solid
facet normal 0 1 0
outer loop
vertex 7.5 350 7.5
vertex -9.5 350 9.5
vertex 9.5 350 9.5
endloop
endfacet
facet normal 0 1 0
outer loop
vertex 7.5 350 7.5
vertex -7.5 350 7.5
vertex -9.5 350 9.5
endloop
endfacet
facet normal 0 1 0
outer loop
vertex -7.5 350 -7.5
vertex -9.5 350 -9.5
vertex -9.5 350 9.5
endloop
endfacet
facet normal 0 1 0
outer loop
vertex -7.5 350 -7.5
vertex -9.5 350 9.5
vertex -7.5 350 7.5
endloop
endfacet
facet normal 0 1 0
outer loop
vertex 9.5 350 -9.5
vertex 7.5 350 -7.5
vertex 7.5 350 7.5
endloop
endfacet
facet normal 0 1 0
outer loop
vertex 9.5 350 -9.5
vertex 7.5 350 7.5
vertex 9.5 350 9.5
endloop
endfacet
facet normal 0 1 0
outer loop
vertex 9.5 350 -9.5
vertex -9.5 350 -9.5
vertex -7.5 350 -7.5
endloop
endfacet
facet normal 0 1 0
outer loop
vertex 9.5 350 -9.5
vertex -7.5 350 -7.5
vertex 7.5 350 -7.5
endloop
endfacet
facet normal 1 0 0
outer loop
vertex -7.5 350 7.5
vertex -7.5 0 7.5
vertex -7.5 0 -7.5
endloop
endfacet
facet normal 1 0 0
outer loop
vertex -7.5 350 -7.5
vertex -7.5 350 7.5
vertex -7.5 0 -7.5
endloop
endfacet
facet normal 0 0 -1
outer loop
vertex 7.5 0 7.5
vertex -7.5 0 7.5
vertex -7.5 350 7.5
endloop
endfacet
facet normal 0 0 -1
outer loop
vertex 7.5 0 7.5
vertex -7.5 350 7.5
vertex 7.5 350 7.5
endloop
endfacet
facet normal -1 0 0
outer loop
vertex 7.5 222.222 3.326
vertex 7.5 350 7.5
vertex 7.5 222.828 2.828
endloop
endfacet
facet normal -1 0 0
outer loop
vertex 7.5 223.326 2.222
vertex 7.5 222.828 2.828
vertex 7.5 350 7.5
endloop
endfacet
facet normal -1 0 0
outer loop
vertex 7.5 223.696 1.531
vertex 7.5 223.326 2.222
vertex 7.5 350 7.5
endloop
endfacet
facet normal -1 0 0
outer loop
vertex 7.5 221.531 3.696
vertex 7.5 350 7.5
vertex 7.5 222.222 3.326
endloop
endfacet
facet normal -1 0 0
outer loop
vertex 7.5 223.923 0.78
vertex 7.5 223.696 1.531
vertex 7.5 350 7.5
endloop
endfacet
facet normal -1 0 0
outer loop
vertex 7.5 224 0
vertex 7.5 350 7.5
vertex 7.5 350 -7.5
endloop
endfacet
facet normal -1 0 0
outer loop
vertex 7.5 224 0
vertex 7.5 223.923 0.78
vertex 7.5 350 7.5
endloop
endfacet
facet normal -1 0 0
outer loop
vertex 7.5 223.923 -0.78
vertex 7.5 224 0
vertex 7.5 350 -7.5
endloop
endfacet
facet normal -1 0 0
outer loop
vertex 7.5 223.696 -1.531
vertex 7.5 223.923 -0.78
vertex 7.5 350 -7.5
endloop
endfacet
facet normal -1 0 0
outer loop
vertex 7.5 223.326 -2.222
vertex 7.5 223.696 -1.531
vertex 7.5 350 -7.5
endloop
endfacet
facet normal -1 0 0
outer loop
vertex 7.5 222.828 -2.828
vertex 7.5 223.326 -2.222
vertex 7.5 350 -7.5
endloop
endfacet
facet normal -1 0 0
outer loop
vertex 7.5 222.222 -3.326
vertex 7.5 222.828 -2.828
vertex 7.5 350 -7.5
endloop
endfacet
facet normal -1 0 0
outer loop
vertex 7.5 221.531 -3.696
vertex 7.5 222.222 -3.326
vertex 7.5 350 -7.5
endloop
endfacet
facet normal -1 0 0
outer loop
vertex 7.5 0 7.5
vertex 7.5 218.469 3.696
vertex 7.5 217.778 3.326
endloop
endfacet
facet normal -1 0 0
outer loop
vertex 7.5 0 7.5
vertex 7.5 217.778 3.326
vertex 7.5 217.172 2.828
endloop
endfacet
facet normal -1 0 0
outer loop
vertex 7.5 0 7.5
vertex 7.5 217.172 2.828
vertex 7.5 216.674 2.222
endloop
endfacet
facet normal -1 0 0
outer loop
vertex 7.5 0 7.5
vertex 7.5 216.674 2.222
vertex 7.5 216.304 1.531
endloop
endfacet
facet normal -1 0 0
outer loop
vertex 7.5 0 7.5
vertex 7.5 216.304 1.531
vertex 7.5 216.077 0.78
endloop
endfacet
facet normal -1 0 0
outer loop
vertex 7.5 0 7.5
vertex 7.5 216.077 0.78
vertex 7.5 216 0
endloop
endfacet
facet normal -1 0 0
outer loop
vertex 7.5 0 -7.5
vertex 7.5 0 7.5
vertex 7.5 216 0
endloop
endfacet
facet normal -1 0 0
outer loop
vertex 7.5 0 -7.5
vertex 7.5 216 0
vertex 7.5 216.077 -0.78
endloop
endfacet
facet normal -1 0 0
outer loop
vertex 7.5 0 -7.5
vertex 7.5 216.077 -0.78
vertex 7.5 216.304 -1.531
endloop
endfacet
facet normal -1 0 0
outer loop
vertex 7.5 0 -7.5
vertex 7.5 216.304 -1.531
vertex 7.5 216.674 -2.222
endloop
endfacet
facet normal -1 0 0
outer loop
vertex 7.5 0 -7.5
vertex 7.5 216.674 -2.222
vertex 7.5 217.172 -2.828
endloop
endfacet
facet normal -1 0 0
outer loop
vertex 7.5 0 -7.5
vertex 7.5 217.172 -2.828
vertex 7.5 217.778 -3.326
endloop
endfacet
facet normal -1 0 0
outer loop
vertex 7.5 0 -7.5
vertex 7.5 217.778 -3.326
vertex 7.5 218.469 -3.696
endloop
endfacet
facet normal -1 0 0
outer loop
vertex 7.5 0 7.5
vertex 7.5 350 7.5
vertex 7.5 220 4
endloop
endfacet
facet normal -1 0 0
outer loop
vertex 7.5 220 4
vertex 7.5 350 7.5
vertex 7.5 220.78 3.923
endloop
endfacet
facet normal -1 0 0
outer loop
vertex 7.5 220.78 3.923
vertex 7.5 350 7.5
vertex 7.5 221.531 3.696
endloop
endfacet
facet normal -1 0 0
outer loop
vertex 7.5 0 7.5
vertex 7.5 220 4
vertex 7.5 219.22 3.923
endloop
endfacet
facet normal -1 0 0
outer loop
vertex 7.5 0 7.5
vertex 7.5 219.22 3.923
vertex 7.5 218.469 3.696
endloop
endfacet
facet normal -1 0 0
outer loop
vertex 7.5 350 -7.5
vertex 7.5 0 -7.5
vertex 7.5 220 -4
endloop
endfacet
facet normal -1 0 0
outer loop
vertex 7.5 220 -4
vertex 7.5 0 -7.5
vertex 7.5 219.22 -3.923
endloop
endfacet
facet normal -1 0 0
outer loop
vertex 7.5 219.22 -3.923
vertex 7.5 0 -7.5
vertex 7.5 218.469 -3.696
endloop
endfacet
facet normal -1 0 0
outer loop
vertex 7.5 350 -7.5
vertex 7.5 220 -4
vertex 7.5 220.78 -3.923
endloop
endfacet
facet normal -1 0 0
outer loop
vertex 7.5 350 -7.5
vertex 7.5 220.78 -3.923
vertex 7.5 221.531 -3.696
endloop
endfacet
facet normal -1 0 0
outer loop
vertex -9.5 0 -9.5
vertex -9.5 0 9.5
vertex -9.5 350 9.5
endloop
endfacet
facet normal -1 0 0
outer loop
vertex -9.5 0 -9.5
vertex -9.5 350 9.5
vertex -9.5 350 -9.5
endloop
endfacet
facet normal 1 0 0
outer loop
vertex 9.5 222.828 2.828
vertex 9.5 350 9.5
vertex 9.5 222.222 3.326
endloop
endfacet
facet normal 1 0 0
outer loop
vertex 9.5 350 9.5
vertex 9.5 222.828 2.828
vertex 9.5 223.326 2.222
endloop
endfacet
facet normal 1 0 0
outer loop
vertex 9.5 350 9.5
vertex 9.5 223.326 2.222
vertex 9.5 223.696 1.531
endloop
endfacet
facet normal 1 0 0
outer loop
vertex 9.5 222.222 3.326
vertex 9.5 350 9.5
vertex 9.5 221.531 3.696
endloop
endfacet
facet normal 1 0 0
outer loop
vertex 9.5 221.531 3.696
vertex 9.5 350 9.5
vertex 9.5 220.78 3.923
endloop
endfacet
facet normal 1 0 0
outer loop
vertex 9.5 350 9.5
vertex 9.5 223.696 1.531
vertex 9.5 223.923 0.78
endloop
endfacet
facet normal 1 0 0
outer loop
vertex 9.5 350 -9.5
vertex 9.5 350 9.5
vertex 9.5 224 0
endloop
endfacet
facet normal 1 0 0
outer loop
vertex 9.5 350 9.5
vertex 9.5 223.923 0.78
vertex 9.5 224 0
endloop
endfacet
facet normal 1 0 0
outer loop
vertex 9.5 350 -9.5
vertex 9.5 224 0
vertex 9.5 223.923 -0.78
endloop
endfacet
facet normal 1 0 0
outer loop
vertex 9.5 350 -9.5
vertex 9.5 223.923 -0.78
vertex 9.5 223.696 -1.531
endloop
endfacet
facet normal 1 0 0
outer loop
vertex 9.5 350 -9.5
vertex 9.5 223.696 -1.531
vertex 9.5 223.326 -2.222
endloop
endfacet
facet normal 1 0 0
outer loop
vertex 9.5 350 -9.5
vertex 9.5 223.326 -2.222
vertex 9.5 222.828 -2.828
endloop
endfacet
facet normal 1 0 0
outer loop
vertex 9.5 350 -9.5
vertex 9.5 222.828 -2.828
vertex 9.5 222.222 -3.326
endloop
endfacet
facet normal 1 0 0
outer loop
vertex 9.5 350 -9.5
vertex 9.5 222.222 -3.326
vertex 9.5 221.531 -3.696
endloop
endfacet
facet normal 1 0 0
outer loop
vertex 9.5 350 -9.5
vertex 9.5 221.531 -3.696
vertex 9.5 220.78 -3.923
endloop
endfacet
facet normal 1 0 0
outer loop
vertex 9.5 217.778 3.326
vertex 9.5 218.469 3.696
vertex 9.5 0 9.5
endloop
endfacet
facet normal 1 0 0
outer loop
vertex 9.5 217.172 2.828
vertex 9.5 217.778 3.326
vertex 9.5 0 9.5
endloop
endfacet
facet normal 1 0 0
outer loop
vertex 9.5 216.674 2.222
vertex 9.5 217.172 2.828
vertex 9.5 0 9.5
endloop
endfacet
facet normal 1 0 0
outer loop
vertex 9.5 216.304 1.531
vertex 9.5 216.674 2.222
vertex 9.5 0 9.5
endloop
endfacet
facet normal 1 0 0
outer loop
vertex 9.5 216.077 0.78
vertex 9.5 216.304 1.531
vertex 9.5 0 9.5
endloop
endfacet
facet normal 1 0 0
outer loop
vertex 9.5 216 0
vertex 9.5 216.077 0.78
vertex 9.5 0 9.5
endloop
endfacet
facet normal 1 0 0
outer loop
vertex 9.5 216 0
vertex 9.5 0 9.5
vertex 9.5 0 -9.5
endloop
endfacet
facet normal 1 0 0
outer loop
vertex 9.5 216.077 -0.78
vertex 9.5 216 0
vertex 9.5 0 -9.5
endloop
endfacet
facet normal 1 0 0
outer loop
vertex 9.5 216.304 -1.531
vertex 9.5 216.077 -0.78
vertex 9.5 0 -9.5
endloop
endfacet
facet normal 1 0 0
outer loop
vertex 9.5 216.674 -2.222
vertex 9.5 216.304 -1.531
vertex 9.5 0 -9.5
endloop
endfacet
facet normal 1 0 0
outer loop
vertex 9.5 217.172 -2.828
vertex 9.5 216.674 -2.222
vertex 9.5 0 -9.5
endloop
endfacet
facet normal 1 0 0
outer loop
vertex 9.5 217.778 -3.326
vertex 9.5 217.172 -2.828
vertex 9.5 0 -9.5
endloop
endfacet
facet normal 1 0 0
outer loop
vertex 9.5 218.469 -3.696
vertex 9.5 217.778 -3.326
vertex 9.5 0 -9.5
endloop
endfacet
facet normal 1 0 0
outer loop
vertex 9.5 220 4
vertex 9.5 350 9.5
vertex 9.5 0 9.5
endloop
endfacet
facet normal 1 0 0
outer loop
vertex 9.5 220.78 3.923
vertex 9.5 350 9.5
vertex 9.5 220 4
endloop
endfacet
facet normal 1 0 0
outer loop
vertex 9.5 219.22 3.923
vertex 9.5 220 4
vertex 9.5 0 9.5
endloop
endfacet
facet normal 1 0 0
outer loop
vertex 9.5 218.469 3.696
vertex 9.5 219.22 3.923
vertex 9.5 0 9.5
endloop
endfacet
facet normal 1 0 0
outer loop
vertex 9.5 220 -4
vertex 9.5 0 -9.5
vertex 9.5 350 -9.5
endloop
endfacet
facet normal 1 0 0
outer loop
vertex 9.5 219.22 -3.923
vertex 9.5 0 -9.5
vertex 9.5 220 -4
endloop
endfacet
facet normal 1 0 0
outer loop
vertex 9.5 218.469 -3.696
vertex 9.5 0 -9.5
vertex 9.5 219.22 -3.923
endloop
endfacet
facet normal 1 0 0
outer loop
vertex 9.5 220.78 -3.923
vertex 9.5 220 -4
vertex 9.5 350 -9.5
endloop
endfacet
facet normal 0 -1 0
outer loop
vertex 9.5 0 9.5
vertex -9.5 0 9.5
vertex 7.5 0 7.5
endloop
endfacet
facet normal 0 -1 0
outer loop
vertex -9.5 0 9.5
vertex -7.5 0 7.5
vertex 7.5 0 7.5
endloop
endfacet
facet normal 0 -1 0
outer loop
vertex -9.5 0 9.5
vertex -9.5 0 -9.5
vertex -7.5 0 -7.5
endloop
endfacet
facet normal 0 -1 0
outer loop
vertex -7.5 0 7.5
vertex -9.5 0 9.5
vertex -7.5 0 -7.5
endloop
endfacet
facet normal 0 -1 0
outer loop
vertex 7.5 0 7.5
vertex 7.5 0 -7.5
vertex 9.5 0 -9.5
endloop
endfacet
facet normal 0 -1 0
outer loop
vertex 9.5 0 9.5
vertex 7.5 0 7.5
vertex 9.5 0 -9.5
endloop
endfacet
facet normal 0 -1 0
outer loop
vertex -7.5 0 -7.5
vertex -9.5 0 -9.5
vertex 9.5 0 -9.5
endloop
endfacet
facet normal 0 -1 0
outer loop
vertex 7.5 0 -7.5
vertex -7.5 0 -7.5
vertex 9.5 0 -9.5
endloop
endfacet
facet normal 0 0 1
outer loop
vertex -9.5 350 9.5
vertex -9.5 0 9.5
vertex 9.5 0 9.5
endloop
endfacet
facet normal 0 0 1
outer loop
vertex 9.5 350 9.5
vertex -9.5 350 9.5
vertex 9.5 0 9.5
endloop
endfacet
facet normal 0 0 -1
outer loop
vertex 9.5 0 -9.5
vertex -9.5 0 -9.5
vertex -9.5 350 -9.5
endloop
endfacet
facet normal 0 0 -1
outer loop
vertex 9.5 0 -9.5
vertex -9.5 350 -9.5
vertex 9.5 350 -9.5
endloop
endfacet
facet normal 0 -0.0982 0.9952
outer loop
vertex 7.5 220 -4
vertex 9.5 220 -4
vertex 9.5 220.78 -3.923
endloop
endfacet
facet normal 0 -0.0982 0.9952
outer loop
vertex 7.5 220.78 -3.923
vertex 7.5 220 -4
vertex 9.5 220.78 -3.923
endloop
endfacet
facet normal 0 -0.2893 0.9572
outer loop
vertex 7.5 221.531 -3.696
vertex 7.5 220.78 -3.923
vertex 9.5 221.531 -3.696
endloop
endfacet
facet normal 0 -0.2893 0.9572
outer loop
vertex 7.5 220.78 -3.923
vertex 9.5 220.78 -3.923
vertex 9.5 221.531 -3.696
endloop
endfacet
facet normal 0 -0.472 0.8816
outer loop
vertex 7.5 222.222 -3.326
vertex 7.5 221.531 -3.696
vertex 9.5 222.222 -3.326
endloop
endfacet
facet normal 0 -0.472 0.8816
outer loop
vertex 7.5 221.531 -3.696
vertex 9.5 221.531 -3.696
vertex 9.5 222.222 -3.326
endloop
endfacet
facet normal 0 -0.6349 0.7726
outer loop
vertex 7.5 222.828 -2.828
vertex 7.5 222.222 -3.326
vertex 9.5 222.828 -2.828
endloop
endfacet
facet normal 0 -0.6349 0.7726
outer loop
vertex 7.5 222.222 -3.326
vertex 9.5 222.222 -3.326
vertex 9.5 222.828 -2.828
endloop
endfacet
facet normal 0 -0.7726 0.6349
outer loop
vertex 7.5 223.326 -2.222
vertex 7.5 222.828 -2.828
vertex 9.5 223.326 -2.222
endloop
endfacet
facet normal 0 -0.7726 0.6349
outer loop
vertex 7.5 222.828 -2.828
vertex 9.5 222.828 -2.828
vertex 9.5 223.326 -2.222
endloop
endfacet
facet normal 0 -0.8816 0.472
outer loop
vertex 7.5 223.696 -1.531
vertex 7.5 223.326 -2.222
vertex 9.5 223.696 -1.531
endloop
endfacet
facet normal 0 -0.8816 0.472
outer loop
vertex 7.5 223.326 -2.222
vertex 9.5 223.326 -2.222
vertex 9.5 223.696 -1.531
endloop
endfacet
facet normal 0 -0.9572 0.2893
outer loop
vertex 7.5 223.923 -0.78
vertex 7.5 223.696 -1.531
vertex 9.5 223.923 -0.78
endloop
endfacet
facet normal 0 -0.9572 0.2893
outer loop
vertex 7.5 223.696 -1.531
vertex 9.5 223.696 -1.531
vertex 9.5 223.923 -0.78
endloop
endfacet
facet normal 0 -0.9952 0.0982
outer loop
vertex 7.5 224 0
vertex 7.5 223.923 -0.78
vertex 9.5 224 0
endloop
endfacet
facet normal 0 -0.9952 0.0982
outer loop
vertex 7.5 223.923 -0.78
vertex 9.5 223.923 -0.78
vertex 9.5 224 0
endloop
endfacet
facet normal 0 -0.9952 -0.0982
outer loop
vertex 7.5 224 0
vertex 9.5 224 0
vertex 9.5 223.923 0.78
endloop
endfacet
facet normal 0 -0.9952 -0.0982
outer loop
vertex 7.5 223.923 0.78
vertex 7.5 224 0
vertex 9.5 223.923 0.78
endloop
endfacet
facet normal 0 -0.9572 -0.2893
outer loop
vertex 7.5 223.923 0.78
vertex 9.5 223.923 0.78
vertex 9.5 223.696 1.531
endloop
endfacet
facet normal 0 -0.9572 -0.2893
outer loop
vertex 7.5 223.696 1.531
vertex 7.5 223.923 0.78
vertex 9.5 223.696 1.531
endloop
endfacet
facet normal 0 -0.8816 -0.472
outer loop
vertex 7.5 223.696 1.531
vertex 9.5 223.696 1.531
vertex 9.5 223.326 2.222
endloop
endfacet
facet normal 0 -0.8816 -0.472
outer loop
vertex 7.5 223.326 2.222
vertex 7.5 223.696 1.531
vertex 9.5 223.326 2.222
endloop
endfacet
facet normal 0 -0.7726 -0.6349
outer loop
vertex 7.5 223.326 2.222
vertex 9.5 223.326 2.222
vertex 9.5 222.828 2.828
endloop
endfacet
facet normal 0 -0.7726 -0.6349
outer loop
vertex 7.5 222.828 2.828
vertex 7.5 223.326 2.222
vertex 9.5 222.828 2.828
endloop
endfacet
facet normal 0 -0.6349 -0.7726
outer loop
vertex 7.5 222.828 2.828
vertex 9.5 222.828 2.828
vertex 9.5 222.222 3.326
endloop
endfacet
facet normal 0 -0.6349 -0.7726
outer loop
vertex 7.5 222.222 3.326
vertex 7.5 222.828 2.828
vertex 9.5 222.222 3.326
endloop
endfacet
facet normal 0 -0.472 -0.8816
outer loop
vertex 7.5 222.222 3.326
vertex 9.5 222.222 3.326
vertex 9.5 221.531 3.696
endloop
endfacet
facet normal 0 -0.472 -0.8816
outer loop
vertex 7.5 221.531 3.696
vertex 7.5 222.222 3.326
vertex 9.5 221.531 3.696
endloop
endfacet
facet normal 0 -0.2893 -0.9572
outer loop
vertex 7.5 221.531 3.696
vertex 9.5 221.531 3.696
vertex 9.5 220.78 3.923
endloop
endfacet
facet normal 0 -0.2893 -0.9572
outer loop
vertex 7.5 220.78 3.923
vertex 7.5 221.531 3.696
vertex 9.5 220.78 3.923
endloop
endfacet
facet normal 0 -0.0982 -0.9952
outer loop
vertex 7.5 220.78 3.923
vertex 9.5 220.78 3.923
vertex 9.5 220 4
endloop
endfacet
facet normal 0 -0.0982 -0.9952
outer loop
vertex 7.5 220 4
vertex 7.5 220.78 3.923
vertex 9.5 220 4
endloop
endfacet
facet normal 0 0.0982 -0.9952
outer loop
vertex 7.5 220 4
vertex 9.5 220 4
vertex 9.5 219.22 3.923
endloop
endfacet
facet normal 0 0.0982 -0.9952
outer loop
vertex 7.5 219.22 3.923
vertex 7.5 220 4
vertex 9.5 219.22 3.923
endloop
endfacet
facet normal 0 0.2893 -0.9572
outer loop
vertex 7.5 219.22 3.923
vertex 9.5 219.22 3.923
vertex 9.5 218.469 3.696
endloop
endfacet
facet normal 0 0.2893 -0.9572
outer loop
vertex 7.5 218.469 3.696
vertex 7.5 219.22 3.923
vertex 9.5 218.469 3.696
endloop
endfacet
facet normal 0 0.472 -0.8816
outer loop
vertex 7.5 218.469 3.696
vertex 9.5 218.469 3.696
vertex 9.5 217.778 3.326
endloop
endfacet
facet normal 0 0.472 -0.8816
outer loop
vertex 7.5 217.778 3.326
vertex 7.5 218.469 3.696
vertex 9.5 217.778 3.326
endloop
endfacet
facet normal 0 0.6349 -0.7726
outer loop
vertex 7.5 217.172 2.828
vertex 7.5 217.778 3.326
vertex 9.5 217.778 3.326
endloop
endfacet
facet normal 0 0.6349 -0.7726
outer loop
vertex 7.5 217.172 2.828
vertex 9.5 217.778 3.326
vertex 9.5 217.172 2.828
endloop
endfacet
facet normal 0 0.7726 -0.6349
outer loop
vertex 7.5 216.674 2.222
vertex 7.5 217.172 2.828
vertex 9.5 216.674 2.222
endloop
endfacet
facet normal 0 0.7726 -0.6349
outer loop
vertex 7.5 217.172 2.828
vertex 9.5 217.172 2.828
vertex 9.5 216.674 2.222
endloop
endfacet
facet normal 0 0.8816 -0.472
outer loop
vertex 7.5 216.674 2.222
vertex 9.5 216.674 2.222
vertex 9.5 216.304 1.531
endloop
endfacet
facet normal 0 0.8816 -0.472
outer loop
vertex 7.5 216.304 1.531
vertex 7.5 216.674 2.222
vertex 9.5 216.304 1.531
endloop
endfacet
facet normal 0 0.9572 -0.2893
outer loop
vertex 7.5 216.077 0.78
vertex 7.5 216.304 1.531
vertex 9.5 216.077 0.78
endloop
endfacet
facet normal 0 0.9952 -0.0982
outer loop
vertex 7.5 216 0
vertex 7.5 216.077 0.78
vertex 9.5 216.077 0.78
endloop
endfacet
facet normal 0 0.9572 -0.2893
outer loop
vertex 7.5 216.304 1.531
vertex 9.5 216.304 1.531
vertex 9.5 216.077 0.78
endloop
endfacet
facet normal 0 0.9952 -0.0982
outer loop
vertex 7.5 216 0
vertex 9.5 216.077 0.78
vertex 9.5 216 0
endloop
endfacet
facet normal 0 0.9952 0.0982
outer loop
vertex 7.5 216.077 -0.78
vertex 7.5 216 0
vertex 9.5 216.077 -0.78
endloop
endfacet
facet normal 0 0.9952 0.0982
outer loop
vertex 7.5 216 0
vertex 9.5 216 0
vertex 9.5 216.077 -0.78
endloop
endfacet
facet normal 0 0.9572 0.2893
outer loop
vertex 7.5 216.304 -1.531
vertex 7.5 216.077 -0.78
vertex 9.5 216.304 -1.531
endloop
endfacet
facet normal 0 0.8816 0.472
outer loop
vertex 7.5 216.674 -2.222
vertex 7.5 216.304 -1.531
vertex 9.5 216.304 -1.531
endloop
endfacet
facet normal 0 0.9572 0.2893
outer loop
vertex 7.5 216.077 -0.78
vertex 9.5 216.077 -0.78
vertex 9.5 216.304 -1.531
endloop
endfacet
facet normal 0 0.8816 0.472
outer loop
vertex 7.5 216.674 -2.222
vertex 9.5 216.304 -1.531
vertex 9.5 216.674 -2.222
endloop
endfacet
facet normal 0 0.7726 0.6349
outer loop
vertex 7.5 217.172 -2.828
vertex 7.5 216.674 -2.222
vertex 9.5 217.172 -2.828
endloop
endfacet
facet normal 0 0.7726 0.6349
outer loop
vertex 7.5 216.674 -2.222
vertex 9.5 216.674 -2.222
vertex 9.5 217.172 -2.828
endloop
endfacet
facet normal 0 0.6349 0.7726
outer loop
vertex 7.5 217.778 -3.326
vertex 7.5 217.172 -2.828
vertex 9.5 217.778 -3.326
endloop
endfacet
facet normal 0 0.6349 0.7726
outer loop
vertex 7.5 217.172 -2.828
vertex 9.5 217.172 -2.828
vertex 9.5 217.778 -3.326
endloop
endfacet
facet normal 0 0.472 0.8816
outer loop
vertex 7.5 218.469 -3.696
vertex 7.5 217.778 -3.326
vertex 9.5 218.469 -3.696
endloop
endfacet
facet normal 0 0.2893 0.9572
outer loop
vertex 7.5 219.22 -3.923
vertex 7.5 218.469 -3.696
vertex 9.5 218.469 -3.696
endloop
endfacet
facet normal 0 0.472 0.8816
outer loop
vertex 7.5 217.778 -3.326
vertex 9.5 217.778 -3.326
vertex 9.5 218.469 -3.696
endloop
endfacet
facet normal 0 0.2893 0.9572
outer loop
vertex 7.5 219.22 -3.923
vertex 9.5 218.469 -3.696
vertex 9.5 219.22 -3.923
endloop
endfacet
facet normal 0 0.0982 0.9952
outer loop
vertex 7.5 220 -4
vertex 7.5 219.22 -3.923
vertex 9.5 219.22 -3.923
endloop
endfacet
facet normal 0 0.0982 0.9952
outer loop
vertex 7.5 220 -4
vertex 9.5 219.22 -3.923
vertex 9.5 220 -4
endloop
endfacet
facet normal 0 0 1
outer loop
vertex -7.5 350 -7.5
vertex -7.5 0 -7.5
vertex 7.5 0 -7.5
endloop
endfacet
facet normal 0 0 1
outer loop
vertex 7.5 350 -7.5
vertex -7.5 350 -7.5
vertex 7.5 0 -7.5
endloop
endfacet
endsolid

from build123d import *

# Parameters (mm, degrees)
SKETCH1_W           = 19
SKETCH1_H           = 19
SKETCH1_W_2         = 15
SKETCH1_H_2         = 15
EXTRUDE_THIN1_DEPTH = 350
SKETCH2_R           = 4
CUT_EXTRUDE1_DEPTH  = 4


with BuildPart() as part:
    # Sketch1 → Extrude-Thin1 (new body)
    with BuildSketch(Plane(origin=(0, 0, 0), x_dir=(1, 0, 0), z_dir=(0, 1, 0))):
        Rectangle(SKETCH1_W, SKETCH1_H)
        Rectangle(SKETCH1_W_2, SKETCH1_H_2, mode=Mode.SUBTRACT)
    extrude(amount=EXTRUDE_THIN1_DEPTH)

    # Sketch2 → Cut-Extrude1 (cut)
    with BuildSketch(Plane(origin=(9.5, 0, 0), x_dir=(0, 0, -1), z_dir=(1, 0, 0))):
        with Locations((0, 220)):
            Circle(SKETCH2_R)
    extrude(amount=-CUT_EXTRUDE1_DEPTH, mode=Mode.SUBTRACT)


solid = part.part
